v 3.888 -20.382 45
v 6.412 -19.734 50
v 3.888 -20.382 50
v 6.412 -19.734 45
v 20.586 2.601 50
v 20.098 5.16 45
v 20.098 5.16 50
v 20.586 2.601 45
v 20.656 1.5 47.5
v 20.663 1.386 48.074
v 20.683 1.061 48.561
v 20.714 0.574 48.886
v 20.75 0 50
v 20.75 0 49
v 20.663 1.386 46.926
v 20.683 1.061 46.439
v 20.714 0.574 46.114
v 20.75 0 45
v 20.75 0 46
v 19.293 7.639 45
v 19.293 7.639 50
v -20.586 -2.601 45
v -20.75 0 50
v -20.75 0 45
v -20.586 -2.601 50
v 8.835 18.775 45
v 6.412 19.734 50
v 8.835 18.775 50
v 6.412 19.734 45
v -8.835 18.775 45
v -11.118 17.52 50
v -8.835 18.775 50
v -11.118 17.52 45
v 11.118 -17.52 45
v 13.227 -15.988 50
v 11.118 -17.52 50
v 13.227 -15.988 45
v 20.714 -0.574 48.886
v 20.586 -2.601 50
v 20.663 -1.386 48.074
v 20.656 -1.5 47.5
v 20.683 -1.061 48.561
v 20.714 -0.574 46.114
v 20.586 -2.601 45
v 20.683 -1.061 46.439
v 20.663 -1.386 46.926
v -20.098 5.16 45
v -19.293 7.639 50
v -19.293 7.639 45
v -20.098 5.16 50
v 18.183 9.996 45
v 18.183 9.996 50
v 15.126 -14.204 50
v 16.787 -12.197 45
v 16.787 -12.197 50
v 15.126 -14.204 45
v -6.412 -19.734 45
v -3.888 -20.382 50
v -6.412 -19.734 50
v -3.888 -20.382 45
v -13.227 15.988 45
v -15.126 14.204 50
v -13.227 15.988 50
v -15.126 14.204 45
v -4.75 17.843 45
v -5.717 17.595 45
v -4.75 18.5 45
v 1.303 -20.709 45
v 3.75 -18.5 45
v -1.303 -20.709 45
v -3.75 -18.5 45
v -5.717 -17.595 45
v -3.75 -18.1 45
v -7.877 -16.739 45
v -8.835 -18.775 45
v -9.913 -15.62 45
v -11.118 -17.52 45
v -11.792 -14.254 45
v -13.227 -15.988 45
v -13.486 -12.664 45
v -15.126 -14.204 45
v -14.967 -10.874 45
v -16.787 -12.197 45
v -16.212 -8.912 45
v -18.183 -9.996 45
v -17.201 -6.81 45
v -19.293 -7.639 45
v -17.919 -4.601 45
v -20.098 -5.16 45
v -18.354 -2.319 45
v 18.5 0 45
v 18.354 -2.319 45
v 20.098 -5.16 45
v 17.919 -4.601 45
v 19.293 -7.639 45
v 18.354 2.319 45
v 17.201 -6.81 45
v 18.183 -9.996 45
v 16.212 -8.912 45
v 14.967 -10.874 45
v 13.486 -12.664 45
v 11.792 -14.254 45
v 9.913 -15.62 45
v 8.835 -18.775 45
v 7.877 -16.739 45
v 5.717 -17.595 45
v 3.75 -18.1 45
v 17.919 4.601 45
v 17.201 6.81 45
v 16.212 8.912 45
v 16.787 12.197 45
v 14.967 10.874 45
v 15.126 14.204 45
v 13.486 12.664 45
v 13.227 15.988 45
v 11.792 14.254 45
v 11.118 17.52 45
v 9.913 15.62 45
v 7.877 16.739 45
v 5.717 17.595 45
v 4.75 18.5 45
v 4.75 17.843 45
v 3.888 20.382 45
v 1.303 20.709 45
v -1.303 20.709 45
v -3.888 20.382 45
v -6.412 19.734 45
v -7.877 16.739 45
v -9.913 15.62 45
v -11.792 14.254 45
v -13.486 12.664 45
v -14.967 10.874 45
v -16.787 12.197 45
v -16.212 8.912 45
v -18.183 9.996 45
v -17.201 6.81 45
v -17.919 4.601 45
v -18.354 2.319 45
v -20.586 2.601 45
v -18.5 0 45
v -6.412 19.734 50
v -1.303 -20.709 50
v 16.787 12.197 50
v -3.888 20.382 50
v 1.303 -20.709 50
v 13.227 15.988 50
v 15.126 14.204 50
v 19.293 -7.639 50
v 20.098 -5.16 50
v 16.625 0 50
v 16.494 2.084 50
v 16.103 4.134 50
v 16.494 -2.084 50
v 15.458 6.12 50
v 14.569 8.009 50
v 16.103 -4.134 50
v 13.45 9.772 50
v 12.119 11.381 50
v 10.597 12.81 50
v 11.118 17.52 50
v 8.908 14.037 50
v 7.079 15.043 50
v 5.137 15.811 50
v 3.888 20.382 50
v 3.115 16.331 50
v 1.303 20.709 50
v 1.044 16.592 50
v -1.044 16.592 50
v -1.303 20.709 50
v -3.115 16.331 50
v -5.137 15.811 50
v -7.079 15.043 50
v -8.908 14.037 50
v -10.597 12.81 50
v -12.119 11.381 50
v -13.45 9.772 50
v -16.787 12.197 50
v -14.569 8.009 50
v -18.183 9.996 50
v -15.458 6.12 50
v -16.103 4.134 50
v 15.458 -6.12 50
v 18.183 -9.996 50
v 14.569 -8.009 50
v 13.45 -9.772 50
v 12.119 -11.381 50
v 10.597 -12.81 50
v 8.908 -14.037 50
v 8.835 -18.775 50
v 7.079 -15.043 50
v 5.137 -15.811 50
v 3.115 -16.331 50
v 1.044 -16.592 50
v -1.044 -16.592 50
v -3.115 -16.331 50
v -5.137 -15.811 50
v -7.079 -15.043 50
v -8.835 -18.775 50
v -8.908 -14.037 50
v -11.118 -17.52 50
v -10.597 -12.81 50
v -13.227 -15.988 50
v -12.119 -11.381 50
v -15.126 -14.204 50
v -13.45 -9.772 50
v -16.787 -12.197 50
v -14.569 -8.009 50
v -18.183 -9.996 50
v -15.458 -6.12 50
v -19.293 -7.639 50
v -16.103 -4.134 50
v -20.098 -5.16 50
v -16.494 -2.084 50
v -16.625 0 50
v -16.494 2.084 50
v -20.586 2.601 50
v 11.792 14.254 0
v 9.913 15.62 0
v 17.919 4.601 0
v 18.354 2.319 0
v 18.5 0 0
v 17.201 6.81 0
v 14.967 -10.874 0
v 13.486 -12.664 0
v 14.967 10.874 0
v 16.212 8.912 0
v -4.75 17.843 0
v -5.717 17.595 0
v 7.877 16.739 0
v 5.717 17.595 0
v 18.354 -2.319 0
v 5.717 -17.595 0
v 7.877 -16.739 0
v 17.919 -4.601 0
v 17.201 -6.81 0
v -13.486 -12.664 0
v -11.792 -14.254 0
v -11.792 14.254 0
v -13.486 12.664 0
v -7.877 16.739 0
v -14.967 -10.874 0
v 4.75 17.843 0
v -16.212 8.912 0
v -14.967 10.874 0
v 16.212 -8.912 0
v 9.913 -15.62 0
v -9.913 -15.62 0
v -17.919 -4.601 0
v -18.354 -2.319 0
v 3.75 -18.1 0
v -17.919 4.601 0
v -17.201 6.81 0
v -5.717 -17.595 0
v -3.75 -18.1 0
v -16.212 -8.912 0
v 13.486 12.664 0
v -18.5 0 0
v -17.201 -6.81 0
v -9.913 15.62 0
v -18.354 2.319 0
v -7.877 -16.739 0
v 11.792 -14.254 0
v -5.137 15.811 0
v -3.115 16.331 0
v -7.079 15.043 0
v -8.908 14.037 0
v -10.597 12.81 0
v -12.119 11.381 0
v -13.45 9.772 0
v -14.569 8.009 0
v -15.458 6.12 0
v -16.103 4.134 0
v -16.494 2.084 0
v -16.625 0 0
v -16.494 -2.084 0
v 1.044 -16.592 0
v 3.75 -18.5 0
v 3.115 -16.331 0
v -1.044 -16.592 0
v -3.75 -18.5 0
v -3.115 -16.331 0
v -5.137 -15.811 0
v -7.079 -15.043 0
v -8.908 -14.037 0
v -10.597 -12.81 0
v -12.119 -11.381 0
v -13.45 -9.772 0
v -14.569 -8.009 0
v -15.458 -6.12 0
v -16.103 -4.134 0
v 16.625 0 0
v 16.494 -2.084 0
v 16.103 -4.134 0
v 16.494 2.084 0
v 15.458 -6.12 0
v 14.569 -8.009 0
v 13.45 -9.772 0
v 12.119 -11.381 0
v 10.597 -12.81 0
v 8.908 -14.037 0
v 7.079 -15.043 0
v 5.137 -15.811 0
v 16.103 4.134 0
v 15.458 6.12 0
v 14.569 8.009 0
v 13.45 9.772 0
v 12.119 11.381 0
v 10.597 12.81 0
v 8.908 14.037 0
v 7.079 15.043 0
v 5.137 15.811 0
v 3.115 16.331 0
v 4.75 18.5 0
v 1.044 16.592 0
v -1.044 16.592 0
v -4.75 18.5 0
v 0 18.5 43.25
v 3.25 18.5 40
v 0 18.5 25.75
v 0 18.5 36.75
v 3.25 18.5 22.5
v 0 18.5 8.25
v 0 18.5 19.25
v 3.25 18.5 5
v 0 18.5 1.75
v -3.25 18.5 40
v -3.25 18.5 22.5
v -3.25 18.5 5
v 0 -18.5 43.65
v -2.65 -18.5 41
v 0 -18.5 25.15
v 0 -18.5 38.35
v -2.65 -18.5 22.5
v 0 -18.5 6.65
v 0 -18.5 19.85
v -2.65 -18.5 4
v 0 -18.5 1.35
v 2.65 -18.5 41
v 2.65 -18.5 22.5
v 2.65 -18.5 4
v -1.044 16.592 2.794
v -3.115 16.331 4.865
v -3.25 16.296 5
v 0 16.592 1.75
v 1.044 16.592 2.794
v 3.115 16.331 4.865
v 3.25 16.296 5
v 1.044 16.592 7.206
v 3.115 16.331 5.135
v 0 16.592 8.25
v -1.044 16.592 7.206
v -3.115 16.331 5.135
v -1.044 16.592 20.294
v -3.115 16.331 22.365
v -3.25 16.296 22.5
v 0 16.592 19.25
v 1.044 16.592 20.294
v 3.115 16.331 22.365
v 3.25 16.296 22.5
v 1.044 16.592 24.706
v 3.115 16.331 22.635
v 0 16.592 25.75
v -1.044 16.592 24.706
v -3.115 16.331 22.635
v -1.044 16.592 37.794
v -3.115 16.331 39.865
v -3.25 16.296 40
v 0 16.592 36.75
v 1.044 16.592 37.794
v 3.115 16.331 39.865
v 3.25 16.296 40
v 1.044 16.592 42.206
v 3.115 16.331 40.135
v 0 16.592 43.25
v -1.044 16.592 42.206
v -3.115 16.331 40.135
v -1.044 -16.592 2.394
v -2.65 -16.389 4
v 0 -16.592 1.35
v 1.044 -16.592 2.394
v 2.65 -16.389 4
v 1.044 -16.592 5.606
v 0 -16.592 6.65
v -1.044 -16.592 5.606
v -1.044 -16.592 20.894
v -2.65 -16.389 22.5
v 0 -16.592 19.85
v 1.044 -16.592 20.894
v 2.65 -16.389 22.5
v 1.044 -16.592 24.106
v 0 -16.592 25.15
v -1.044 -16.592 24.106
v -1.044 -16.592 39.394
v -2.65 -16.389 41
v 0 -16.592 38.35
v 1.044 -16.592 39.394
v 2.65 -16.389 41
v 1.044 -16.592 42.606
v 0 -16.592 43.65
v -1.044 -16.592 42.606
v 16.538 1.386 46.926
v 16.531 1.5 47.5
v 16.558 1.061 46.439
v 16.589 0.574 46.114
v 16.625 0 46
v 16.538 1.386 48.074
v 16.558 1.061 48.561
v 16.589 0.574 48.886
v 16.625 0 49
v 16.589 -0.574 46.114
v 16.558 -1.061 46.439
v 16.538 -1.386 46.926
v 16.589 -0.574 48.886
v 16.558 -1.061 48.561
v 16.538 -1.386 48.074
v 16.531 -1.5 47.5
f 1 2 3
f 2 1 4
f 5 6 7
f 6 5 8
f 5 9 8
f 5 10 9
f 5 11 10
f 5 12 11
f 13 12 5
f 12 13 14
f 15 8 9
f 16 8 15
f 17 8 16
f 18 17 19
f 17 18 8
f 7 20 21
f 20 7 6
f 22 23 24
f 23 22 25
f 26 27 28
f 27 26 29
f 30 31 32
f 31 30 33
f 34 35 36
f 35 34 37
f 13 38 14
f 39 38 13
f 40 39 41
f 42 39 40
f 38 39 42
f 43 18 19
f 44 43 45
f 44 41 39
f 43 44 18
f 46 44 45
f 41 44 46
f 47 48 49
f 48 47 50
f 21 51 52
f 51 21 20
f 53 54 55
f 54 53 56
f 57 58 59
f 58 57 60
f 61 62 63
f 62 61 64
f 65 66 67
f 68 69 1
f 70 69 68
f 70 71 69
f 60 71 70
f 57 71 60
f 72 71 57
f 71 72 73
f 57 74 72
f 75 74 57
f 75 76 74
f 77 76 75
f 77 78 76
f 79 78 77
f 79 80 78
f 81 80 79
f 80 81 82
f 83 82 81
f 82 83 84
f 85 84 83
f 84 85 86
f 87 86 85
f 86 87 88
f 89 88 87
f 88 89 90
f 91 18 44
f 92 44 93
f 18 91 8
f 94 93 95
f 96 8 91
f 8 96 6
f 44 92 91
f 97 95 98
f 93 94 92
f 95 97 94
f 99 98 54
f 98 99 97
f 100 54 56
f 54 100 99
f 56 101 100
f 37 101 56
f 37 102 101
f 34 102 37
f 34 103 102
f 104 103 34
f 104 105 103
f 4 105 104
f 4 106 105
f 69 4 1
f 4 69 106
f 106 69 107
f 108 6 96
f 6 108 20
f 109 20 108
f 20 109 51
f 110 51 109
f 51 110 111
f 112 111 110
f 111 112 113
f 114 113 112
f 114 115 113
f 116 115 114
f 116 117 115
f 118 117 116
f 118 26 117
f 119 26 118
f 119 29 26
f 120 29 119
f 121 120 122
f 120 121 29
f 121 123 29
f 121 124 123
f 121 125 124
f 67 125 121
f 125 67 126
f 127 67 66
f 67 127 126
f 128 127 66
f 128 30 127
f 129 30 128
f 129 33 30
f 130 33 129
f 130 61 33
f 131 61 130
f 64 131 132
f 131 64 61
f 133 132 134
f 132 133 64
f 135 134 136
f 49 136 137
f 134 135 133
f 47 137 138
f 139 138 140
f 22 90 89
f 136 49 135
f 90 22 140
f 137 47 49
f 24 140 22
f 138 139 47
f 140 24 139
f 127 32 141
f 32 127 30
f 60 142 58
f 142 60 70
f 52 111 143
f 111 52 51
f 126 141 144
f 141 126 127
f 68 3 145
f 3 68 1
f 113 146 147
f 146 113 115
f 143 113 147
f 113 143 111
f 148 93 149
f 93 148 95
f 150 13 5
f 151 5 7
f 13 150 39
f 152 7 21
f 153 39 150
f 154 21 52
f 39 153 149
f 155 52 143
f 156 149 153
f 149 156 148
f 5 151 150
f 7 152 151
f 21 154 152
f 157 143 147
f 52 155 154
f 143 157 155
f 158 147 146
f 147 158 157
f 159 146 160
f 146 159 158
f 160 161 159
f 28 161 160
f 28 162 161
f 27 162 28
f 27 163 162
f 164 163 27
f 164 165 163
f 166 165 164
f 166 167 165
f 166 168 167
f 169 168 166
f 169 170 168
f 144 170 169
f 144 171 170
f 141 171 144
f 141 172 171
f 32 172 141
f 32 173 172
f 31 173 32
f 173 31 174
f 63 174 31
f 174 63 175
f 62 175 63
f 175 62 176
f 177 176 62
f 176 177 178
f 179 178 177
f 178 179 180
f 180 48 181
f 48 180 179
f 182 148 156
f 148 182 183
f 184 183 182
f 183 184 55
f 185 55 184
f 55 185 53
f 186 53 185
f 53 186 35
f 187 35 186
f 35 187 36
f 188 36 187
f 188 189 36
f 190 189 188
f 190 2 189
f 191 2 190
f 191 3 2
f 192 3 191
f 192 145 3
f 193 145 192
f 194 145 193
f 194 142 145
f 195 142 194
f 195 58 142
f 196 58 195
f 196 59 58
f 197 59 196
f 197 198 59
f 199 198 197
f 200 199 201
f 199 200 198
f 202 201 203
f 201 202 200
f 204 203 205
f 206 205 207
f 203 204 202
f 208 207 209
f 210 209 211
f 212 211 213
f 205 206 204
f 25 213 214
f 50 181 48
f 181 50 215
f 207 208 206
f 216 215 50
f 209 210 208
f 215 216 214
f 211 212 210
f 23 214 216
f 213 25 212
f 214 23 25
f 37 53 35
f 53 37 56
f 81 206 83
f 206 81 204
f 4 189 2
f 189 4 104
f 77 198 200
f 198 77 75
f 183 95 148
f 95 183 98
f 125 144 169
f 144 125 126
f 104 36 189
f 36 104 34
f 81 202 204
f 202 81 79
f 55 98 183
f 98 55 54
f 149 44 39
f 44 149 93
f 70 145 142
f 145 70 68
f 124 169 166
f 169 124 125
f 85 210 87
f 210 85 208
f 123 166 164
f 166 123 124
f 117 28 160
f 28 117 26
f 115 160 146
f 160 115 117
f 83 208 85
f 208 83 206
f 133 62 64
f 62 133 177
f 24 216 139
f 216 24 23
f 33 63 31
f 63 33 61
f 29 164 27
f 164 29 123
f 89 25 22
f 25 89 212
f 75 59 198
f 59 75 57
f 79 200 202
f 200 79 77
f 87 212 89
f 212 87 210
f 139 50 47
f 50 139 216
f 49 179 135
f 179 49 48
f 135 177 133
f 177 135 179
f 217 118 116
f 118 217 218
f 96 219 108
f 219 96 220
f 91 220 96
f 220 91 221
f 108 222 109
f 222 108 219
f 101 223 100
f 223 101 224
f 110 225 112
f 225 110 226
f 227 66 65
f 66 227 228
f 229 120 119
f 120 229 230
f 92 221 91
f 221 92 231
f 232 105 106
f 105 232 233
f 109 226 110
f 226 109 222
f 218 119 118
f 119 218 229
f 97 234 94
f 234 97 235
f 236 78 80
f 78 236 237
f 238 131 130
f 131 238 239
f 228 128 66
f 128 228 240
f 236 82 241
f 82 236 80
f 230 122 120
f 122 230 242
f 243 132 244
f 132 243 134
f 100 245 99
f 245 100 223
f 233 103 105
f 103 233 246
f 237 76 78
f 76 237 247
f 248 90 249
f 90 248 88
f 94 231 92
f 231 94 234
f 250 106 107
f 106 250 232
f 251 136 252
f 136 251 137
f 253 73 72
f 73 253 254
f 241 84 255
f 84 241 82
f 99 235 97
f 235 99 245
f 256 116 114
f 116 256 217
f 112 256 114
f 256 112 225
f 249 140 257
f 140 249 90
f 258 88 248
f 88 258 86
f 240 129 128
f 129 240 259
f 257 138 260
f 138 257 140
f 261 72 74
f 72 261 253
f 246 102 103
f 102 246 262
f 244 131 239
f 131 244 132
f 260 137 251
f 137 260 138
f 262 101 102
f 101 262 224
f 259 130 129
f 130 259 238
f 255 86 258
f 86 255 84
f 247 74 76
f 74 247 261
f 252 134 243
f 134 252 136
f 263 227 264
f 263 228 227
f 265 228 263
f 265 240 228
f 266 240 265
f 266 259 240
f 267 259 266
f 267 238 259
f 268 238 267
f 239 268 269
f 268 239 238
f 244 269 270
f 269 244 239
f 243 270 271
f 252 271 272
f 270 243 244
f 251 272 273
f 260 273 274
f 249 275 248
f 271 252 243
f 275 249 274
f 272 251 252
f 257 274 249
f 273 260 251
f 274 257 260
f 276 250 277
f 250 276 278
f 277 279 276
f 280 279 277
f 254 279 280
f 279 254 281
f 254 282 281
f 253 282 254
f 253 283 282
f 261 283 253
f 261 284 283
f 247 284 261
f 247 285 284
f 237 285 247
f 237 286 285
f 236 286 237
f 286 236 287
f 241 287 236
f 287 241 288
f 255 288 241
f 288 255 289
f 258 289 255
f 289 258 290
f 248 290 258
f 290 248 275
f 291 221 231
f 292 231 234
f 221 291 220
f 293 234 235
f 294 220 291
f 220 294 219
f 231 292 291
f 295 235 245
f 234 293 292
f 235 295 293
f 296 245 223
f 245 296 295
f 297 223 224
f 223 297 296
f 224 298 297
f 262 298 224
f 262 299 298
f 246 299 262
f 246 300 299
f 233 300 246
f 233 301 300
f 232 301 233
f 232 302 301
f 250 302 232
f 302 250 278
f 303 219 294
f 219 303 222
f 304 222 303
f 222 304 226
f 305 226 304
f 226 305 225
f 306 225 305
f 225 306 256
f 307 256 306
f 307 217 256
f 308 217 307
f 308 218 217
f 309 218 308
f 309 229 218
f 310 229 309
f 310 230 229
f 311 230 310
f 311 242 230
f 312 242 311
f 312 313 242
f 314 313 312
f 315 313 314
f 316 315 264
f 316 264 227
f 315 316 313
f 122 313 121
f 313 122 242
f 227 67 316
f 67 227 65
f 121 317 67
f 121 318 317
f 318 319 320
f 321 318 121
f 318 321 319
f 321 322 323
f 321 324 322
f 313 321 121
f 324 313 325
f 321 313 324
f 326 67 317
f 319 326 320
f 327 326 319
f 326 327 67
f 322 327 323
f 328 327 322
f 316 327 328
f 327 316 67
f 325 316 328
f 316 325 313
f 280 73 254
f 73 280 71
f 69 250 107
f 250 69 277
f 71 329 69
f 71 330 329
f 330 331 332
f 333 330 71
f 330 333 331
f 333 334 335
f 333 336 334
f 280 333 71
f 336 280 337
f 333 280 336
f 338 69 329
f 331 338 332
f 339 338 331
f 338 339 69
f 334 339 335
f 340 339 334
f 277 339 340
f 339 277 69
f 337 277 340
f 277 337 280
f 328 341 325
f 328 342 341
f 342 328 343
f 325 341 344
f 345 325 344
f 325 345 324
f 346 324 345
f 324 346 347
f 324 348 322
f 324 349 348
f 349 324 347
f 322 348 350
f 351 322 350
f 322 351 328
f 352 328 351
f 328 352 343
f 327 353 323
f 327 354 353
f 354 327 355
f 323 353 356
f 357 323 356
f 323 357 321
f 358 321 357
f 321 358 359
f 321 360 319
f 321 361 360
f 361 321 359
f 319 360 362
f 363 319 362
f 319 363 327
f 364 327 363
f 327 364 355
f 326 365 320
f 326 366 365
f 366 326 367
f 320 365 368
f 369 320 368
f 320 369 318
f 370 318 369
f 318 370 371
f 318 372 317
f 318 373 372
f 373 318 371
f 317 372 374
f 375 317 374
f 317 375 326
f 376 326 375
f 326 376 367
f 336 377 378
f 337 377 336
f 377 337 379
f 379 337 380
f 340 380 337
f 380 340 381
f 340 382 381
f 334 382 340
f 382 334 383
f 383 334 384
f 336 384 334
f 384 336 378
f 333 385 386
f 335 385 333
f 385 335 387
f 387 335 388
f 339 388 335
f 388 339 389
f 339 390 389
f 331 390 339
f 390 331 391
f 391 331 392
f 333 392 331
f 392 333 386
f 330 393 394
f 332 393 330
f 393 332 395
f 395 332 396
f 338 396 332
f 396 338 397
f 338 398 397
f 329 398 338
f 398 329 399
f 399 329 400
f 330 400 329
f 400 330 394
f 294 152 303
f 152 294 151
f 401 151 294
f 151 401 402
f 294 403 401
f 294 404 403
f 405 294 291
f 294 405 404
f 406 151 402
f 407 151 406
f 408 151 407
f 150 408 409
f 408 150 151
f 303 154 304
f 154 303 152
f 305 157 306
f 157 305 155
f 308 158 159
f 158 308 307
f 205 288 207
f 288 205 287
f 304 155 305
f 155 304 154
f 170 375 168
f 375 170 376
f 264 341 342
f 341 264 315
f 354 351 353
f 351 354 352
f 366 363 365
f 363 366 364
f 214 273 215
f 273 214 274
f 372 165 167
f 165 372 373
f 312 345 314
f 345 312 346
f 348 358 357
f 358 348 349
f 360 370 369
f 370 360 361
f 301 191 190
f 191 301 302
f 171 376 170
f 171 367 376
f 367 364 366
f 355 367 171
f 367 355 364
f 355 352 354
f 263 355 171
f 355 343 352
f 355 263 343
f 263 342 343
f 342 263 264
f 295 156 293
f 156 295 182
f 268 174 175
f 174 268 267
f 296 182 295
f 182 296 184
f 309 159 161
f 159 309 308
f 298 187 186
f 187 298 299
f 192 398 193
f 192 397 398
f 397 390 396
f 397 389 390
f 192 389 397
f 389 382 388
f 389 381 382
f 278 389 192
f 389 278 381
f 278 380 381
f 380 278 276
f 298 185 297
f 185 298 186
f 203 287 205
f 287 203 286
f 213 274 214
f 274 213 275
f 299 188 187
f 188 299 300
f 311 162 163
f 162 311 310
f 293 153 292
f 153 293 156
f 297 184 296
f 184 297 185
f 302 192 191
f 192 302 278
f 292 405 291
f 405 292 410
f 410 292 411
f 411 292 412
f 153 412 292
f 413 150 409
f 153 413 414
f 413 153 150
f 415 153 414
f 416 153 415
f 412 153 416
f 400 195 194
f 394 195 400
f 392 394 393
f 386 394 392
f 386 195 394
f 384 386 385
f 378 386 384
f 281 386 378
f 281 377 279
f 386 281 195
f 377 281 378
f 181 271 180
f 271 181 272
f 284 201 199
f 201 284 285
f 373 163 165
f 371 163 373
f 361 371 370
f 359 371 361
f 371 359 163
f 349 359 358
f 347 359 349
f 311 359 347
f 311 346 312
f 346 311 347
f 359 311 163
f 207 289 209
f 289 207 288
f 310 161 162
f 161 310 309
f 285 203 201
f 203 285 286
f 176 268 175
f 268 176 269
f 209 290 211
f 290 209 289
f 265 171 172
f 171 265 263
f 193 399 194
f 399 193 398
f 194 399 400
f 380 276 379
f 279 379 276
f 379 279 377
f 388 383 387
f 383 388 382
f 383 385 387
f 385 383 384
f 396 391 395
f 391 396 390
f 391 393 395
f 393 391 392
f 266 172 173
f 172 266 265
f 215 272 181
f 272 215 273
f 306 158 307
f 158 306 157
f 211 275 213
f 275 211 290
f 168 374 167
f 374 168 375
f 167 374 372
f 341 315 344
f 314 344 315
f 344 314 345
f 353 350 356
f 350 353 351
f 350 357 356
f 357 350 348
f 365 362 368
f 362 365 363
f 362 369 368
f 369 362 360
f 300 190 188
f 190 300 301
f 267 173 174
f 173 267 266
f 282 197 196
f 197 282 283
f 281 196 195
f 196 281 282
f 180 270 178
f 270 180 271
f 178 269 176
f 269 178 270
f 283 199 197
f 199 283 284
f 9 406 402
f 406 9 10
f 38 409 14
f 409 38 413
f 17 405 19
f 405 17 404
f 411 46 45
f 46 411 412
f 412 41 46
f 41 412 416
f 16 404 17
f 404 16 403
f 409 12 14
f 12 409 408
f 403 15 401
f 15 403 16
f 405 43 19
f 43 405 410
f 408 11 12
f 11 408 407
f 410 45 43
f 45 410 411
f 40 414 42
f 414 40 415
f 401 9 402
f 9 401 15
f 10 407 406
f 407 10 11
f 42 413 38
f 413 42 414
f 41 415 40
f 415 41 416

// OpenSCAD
use <Zahnstange_und_ritzel.scad>;

printerTolerance=0.25;
axleDiameter=3;
drawTubeInnerDiameter=33;
drawTubeWallThickness=2.25;
drawTubeLength=50;
drawTubeLipThickness=2;
drawTubeLipHeight=5;
eyepieceSetScrewDiameter=3;
setScrewRightOfRack=true;
outerTubeLength=30;
focuserTubeTolerance=0.25;
telescopeTubeDiameter=200; // 0 for flat mount
slideWidth=10;
rackWidth=8;

module dummy() {}

rackColor = "red";
slideColor = "blue";

nudge = 0.001;

module diamondCylinder(d=1,h=1) {
    cylinder(d=d, h=h, $fn=4);
}

module tube(id=undef, od=undef, wall=undef, h=1) {
    innerDiameter = id==undef ? od-2*wall : id;
    outerDiameter = od==undef ? id+2*wall : od;

    render(convexity=2)
    difference() {
        cylinder(d=outerDiameter, h=h);
        translate([0,0,-nudge])
            cylinder(d=innerDiameter, h=h+2*nudge);
    }
}

function diamondSize(baseWidth,male=true) = (baseWidth * 0.6) + (male ? -2*printerTolerance : 2*printerTolerance);

function diamondPositions(length,width) = [width/2,length/2,length-width/2];

module drawTube() {
    clearLength = drawTubeLength-drawTubeLipHeight;
    od = drawTubeInnerDiameter+2*drawTubeWallThickness-2*printerTolerance;
    
    render(convexity=2)
    difference() {
        union() {
            cylinder(d=od, h=drawTubeLength, $fn=50);
            translate([0,0,drawTubeLength-drawTubeLipHeight]) tube(id=drawTubeInnerDiameter, wall=drawTubeWallThickness+drawTubeLipThickness, h=drawTubeLipHeight, $fn=50);
            translate([-slideWidth/2+printerTolerance,0,0])
            cube([slideWidth-2*printerTolerance,od/2,clearLength]);
            rotate([0,0,180])
            translate([-rackWidth/2+printerTolerance,0,0])            
            cube([rackWidth-2*printerTolerance,od/2,clearLength]);
        }
        translate([0,0,-nudge])
        cylinder(d=drawTubeInnerDiameter+printerTolerance, h=drawTubeLength+2*nudge, $fn=50);
        rotate([0,0,setScrewRightOfRack ? 0 : 180])
        translate([drawTubeInnerDiameter/2-drawTubeLipThickness,0,drawTubeLength-drawTubeLipHeight/2])
        rotate([0,90,0])
        cylinder(d=eyepieceSetScrewDiameter, h=4*drawTubeLipThickness,$fn=16);        
        for (z=diamondPositions(clearLength,slideWidth)) {
            translate([0,0,z])
            rotate([-90,0,0])
            diamondCylinder(d=diamondSize(slideWidth,male=false),h=od+nudge);
        }
        for (z=diamondPositions(clearLength,rackWidth)) {
            translate([0,0,z])
            rotate([0,0,180])
            rotate([-90,0,0])
            diamondCylinder(d=diamondSize(rackWidth,male=false),h=od+nudge);
        }
    }
}

drawTube();
